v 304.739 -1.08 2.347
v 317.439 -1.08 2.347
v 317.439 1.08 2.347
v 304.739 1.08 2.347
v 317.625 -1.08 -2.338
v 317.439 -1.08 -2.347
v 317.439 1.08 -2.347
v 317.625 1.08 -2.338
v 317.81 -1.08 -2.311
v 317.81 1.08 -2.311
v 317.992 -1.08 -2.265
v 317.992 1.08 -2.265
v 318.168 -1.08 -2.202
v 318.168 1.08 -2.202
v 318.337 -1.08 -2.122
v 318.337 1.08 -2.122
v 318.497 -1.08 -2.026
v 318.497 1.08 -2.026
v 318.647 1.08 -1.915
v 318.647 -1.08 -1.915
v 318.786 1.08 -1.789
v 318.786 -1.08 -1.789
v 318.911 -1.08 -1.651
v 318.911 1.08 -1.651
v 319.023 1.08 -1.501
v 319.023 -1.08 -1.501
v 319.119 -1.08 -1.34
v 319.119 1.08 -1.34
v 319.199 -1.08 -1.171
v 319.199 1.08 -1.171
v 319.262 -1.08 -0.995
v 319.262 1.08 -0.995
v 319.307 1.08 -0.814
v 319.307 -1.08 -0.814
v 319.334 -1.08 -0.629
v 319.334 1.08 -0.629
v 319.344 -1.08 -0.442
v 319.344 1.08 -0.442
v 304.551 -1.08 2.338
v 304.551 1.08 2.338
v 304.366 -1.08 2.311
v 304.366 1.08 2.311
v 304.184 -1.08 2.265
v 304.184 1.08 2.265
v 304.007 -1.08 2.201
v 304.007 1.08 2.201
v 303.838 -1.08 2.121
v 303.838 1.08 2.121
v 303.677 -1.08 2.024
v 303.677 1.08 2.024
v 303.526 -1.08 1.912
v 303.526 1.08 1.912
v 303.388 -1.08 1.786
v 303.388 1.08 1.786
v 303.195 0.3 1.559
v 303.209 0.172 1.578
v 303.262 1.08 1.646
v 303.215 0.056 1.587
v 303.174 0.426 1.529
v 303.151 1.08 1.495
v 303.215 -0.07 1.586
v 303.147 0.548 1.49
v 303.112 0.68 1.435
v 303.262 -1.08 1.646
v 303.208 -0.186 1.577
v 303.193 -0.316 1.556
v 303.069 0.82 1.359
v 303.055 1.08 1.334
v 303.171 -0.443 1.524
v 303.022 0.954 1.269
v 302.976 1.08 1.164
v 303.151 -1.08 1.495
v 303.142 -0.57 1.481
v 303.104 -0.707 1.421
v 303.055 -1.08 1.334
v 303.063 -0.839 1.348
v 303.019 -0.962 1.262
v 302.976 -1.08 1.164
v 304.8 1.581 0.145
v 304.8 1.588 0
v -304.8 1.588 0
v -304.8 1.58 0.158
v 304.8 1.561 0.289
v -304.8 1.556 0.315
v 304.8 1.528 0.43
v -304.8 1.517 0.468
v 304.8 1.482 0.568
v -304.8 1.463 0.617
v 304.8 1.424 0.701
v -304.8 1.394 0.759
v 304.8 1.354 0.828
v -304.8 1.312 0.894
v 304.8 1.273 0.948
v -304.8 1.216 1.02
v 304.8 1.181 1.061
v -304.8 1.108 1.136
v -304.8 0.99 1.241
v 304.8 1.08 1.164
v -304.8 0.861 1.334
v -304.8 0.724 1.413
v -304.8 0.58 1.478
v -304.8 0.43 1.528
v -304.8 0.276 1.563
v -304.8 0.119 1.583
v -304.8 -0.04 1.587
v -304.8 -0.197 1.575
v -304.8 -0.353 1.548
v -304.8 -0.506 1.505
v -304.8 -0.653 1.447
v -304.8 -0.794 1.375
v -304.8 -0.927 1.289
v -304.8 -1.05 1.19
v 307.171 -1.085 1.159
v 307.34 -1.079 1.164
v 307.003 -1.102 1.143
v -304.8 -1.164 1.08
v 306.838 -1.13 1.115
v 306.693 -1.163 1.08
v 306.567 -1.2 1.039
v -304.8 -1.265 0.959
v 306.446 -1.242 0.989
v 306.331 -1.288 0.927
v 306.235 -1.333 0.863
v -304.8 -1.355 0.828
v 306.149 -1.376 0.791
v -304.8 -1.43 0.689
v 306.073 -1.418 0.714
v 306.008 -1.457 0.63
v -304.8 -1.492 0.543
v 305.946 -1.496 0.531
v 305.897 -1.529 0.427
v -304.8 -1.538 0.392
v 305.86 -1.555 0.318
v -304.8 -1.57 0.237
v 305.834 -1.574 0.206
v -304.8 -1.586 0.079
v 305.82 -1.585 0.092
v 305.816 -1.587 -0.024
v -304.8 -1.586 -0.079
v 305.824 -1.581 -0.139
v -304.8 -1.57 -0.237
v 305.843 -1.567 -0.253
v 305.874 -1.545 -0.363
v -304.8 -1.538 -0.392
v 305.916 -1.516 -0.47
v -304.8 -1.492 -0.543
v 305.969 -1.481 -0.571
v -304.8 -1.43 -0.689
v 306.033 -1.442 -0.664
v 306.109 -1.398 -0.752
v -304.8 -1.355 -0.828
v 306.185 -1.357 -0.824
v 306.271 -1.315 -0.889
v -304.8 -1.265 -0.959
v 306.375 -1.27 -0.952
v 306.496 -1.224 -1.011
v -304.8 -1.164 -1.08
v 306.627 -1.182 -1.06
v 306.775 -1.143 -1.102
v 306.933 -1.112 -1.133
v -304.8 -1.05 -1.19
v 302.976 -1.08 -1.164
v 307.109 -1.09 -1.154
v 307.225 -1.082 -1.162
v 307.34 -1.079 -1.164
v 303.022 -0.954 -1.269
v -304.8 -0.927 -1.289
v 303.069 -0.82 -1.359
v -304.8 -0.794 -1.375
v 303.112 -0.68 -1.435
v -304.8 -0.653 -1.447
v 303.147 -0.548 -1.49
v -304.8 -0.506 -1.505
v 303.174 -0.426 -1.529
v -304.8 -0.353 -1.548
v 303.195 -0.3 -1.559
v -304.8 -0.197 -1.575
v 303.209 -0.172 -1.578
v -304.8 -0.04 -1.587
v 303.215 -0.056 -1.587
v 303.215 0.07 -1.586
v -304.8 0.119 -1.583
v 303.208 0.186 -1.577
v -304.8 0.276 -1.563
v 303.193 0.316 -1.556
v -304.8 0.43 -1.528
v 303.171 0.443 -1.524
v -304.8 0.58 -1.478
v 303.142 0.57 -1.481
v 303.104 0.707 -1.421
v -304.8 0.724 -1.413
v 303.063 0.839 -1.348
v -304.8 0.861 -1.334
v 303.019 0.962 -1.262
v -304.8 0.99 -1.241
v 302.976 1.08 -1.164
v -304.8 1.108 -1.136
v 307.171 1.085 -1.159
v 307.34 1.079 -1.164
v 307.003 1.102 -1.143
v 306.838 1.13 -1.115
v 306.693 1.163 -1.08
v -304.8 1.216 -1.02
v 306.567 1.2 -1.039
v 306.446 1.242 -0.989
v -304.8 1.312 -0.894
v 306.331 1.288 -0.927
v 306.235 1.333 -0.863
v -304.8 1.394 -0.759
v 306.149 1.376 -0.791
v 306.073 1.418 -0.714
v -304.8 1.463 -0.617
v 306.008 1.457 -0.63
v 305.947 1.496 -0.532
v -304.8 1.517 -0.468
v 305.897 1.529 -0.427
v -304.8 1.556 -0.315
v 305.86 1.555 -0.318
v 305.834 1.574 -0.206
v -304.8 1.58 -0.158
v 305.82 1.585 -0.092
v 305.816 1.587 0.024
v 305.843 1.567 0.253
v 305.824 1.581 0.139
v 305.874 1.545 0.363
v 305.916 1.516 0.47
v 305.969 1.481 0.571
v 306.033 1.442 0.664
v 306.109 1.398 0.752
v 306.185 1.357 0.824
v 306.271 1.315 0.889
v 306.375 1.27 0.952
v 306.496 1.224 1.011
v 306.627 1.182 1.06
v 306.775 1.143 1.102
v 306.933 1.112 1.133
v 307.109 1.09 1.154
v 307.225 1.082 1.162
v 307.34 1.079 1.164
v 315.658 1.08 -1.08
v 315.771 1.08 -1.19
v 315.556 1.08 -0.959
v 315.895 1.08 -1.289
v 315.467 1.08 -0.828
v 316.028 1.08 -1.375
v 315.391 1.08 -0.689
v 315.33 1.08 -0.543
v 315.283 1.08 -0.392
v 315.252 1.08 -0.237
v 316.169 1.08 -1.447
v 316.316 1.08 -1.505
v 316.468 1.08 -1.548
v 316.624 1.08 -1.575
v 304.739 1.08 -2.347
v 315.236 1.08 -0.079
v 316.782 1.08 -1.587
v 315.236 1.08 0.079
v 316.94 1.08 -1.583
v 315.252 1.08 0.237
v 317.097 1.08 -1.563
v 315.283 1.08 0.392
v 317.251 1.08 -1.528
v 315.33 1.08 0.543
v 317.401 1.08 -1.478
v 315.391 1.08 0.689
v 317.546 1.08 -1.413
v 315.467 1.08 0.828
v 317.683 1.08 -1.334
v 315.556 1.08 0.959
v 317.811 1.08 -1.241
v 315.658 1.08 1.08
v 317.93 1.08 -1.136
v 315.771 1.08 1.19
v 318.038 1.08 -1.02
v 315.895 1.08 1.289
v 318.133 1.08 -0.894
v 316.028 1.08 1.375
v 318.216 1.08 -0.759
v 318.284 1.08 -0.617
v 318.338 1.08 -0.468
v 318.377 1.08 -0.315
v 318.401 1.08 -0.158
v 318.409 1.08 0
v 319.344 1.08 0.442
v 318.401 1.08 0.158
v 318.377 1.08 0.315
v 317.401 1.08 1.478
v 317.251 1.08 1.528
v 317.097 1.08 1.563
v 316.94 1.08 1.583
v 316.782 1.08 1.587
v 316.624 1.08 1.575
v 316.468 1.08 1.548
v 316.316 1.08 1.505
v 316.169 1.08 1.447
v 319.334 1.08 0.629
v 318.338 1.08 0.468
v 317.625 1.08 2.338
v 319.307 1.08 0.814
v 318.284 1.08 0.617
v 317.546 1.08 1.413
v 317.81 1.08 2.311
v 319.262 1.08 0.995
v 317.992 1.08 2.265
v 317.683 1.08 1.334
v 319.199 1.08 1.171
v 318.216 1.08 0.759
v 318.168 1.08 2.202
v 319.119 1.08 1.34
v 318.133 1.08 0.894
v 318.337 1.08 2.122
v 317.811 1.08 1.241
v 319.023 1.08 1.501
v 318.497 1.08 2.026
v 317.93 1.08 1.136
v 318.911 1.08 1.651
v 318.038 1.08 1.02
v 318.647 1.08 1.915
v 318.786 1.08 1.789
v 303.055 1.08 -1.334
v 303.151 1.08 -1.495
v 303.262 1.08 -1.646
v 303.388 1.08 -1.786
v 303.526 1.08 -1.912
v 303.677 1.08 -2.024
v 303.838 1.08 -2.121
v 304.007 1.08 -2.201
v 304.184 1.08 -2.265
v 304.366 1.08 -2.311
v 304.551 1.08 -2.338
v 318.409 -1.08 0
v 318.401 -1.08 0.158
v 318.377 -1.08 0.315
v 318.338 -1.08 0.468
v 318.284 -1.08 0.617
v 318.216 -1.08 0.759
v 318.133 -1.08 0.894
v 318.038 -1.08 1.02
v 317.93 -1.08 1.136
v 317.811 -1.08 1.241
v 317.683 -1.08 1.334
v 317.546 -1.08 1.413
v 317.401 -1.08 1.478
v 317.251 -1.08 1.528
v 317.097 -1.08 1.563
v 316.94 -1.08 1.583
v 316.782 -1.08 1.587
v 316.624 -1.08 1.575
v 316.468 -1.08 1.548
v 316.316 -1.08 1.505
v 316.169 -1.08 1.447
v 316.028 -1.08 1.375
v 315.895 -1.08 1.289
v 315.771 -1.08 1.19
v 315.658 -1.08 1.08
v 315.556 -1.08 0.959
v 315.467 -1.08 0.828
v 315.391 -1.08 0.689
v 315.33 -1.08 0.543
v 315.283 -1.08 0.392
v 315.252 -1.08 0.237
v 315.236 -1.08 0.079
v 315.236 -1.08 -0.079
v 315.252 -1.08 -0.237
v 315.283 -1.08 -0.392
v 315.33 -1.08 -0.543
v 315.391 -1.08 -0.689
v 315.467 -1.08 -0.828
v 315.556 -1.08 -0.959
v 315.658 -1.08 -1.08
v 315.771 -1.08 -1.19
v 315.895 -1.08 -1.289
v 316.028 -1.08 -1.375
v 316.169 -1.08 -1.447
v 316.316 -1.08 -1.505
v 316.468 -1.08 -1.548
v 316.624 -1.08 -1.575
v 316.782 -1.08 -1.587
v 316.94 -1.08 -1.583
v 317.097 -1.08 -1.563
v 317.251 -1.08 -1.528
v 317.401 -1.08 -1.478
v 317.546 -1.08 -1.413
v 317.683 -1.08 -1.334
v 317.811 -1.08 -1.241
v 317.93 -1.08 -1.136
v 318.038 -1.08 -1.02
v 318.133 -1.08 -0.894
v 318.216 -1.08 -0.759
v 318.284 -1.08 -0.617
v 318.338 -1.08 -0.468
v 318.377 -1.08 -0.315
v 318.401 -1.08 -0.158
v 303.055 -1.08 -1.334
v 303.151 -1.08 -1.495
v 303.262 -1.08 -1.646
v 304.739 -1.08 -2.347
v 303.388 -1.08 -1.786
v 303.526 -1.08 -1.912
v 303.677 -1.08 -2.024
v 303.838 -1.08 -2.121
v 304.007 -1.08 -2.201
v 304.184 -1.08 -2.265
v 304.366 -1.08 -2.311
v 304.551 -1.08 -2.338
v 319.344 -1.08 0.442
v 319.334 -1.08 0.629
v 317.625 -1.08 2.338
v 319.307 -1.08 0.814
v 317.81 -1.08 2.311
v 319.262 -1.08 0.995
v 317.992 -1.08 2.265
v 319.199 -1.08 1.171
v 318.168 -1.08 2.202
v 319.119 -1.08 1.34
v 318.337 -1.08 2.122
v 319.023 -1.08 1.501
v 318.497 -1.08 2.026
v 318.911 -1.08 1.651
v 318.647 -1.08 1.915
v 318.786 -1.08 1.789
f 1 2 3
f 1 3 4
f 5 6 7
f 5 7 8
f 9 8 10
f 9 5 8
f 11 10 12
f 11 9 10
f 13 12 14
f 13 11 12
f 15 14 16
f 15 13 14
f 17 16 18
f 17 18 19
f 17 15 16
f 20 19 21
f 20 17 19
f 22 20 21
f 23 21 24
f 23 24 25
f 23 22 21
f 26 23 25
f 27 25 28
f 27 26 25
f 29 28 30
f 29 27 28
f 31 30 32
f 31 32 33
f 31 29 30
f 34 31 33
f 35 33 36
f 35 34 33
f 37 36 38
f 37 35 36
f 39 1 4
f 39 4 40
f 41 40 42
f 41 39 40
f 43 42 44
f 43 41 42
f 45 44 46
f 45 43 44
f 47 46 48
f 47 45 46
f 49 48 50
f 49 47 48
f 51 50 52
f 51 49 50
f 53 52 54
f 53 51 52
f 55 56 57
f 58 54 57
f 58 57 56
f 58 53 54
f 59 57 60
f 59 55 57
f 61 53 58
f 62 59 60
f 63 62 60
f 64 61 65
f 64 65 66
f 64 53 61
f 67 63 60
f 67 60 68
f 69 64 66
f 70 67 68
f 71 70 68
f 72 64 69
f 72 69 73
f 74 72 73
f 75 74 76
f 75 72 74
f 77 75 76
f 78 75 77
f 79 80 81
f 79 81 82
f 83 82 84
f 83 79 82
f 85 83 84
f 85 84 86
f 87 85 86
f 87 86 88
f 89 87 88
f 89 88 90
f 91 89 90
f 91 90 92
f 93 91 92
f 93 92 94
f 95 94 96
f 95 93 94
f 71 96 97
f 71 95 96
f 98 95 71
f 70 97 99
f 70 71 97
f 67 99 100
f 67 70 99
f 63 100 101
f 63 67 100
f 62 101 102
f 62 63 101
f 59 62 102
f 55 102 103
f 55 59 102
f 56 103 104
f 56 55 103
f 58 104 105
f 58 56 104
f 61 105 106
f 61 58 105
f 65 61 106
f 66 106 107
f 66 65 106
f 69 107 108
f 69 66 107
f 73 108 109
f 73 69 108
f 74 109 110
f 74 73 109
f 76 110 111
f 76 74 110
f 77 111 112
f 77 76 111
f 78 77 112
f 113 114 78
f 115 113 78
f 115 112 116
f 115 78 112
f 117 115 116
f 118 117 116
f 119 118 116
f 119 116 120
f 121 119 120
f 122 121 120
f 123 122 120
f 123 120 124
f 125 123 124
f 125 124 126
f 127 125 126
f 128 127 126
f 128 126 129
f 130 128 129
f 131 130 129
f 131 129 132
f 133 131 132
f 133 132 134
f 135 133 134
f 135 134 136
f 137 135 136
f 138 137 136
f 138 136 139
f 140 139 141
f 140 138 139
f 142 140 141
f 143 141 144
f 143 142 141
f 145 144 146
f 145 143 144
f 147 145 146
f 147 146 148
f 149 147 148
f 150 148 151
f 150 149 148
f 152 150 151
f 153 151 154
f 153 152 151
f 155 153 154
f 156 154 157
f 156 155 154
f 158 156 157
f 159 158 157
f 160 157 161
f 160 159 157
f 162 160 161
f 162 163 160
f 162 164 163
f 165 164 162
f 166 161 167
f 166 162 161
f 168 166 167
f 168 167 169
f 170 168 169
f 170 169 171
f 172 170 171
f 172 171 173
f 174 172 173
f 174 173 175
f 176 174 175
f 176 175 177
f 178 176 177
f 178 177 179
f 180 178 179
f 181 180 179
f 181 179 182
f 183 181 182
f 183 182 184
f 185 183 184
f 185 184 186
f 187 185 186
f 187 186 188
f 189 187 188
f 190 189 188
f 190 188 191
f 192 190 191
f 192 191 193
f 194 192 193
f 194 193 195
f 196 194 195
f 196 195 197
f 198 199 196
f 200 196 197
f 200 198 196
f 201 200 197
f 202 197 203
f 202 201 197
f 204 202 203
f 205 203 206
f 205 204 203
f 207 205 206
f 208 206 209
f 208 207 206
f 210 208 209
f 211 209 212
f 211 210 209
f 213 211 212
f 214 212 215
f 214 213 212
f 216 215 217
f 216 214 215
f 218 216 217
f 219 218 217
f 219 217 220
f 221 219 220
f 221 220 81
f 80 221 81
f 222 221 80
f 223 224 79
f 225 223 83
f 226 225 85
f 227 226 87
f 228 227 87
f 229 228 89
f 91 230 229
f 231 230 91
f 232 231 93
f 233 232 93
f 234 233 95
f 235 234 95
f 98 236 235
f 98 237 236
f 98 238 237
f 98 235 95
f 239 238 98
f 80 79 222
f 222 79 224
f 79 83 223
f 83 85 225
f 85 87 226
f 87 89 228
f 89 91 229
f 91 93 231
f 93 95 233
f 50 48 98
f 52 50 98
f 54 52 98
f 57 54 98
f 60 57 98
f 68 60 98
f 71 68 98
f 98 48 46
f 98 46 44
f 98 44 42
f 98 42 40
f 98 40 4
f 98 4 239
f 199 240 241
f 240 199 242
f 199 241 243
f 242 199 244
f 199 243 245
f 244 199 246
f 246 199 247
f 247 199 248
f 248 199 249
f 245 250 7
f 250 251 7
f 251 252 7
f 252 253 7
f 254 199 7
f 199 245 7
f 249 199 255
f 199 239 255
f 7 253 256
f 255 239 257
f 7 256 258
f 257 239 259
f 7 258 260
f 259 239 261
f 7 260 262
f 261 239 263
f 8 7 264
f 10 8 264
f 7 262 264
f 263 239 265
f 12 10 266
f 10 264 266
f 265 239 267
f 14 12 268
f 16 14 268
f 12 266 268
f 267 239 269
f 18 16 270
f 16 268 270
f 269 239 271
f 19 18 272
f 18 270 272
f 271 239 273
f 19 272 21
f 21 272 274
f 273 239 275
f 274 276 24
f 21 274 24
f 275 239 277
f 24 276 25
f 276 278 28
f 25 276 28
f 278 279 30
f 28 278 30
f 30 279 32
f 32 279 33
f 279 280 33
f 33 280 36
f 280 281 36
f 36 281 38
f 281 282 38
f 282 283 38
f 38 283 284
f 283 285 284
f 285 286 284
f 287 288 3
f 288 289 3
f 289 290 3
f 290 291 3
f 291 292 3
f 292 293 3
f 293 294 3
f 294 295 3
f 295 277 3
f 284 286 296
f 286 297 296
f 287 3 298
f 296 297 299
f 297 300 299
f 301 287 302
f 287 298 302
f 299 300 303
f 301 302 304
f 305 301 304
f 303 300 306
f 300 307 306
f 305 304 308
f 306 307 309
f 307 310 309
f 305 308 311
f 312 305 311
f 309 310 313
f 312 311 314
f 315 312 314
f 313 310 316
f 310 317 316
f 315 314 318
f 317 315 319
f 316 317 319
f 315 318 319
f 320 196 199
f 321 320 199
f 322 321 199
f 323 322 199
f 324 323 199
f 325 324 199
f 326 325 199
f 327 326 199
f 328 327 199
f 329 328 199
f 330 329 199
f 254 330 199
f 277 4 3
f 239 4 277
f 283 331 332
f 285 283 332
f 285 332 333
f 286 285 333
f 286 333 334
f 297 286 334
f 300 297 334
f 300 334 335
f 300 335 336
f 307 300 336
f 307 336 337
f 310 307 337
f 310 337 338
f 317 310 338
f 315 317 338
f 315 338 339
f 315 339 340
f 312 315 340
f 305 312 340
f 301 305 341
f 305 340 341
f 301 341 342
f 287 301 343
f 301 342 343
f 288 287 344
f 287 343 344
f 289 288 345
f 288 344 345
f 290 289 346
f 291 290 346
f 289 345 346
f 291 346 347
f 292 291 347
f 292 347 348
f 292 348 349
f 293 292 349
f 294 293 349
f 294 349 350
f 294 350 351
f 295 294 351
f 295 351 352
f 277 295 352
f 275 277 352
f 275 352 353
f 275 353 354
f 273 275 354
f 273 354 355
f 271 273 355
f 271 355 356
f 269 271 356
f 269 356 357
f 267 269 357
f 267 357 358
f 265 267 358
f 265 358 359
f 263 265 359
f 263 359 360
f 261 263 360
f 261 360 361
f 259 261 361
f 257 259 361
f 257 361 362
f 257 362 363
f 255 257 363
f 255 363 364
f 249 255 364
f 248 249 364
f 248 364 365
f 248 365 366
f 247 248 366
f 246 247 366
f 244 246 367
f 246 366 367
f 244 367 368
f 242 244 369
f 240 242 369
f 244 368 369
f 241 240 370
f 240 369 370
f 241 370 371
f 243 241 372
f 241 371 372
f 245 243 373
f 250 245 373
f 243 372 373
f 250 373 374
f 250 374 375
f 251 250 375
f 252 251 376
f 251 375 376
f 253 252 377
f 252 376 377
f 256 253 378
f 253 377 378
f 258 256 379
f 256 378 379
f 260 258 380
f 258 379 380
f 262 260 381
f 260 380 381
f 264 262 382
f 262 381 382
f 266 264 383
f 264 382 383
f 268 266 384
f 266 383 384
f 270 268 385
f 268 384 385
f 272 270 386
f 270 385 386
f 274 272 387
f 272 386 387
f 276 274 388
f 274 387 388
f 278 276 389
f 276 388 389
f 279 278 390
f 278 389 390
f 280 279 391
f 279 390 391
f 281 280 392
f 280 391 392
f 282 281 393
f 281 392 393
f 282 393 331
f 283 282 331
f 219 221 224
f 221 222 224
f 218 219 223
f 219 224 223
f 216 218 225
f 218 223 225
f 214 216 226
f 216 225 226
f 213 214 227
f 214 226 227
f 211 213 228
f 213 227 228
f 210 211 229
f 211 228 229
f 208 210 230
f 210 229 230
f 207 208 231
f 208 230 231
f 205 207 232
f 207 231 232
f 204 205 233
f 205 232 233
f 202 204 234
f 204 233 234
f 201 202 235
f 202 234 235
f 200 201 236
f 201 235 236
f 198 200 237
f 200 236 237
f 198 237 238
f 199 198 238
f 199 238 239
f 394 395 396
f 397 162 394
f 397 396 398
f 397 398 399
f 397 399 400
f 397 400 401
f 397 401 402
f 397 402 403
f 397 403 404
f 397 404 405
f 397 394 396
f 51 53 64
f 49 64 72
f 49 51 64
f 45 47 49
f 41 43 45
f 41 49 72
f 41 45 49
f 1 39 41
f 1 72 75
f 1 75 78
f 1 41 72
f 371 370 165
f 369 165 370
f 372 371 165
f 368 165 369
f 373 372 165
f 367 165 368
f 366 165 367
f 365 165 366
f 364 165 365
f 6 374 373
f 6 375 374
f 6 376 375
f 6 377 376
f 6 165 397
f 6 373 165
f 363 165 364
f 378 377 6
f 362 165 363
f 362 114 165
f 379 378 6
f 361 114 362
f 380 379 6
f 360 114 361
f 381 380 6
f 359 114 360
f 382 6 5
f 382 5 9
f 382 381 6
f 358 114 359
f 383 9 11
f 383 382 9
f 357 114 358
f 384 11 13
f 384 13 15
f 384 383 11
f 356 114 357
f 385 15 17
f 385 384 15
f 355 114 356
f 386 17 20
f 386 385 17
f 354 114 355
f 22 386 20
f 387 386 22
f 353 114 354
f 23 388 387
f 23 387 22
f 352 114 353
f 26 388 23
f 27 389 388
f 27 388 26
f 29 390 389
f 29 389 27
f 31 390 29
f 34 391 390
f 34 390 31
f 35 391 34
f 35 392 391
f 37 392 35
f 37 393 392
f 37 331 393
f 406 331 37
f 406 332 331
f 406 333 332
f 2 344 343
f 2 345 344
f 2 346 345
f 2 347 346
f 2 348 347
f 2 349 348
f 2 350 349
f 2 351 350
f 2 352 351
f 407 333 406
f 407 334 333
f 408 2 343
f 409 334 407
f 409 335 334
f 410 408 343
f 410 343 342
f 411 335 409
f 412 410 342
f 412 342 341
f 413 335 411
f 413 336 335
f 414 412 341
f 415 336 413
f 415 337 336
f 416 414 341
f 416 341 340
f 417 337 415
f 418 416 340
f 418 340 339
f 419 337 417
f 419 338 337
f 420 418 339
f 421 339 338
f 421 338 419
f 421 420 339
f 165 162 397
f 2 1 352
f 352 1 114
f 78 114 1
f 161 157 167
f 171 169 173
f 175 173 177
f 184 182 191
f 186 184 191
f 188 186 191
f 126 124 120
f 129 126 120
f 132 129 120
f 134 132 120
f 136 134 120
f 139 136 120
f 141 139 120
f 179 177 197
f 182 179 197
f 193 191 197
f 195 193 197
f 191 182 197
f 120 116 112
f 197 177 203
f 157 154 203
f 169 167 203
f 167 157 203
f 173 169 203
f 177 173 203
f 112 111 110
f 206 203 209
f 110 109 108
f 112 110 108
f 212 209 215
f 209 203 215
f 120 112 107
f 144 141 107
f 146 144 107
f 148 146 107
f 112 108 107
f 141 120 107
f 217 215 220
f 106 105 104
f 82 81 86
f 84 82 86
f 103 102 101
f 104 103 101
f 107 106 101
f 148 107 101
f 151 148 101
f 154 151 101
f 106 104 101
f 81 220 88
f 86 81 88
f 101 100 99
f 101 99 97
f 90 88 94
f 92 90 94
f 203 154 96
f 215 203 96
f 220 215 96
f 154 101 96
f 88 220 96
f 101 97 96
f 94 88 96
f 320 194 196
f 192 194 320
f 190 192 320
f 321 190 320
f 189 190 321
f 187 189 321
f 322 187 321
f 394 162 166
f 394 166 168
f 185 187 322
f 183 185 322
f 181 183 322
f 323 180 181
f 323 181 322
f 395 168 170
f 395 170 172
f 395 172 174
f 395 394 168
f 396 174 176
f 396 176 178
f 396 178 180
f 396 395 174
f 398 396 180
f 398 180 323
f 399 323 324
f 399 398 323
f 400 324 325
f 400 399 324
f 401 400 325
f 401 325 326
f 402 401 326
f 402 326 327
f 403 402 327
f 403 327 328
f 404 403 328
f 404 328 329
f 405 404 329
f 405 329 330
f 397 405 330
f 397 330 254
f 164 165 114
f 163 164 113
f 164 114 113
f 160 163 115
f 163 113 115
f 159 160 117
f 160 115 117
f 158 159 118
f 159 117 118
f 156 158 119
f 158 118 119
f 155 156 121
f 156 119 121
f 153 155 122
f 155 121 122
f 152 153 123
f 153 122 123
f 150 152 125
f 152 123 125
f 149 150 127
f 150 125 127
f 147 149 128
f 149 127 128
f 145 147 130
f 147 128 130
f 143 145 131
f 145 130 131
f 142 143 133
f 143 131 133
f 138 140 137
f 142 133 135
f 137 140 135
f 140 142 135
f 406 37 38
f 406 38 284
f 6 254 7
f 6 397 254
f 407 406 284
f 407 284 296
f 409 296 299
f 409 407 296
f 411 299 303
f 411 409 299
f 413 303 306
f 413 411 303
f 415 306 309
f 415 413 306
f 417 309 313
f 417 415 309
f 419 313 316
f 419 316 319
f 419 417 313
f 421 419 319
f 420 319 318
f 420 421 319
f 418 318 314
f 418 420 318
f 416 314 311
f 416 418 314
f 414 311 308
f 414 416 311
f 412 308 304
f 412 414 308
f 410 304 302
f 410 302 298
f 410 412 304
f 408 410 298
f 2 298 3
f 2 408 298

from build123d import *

# Parameters (mm, degrees)
F0_R         = 1.5875
F1_DEPTH     = 304.8
F3_DEPTH     = 1.0795
F4_T4_DEPTH  = 15.027948453
F4_S5_R      = 1.5875
F4_T6_DEPTH  = 9
F4_T10_DEPTH = 15.027948453
F4_S11_R     = 1.5875
F4_T12_DEPTH = 9
F5_R         = 1.5875
F6_DEPTH     = 2.6680001


# Not quite as in the source:
# - a fillet or chamfer that OpenCascade refuses, or shapes differently, is made with other operations: its cross-section is extruded or revolved along the edge and cut away or added


with BuildPart() as f1:
    # F0 (on Right) → F1 (new body, symmetric)
    with BuildSketch(Plane.YZ):
        Circle(F0_R)
    extrude(amount=F1_DEPTH, both=True)

    # F2 (on Front) → F3 (join, symmetric)
    with BuildSketch(Plane.XZ):
        with BuildLine():
            Line((304.7385620117, -2.3473887456), (317.4385620117, -2.3473887456))
            ThreePointArc((317.4385620117, -2.3473887456), (318.7856004299, -1.7894271638), (319.3435620117, -0.4423887456))
            Line((319.3435620117, -0.4423887456), (319.3435620117, 0.4423887456))
            ThreePointArc((319.3435620117, 0.4423887456), (318.7856004299, 1.7894271638), (317.4385620117, 2.3473887456))
            Line((317.4385620117, 2.3473887456), (304.7385620117, 2.3473887456))
            ThreePointArc((304.7385620117, 2.3473887456), (303.3915235936, 1.7894271638), (302.8335620117, 0.4423887456))
            Line((302.8335620117, 0.4423887456), (302.8335620117, -0.4423887456))
            ThreePointArc((302.8335620117, -0.4423887456), (303.3915235936, -1.7894271638), (304.7385620117, -2.3473887456))
        make_face()
    extrude(amount=F3_DEPTH, both=True)

    # F4: fillet of radius 2.54 on 2 edges, made by hand


with BuildPart() as f4_tool2:
    # F4_s3 → F4_t4 (new body)
    with BuildSketch(Plane.XY.offset(7.5139742265)):
        with BuildLine():
            ThreePointArc((307.34, -1.0795), (305.5439487758, -1.8234487758), (304.8, -3.6195))
            Line((304.8, -3.6195), (304.8, -1.0795))
            Line((304.8, -1.0795), (307.34, -1.0795))
        make_face()
    extrude(amount=-F4_T4_DEPTH)

    # F4_s5 → F4_t6 (intersect, symmetric)
    with BuildSketch(Plane.YZ.offset(306.1)):
        Circle(F4_S5_R)
    extrude(amount=F4_T6_DEPTH, both=True, mode=Mode.INTERSECT)


with BuildPart() as f1_1:
    add(f1.part)

    # F4_t1: union F4_tool2
    add(f4_tool2.part)


with BuildPart() as f4_tool8:
    # F4_s9 → F4_t10 (new body)
    with BuildSketch(Plane.XY.offset(7.5139742265)):
        with BuildLine():
            ThreePointArc((304.8, 3.6195), (305.5439487758, 1.8234487758), (307.34, 1.0795))
            Line((307.34, 1.0795), (304.8, 1.0795))
            Line((304.8, 1.0795), (304.8, 3.6195))
        make_face()
    extrude(amount=-F4_T10_DEPTH)

    # F4_s11 → F4_t12 (intersect, symmetric)
    with BuildSketch(Plane.YZ.offset(306.1)):
        Circle(F4_S11_R)
    extrude(amount=F4_T12_DEPTH, both=True, mode=Mode.INTERSECT)


with BuildPart() as f1_2:
    add(f1_1.part)

    # F4_t7: union F4_tool8
    add(f4_tool8.part)

    # F5 (on face) → F6 (cut, through all)
    with BuildSketch(Plane.XZ.offset(1.0795)):
        with Locations((316.8214559555, 0)):
            Circle(F5_R)
    extrude(amount=-F6_DEPTH, mode=Mode.SUBTRACT)


solid = f1_2.part
